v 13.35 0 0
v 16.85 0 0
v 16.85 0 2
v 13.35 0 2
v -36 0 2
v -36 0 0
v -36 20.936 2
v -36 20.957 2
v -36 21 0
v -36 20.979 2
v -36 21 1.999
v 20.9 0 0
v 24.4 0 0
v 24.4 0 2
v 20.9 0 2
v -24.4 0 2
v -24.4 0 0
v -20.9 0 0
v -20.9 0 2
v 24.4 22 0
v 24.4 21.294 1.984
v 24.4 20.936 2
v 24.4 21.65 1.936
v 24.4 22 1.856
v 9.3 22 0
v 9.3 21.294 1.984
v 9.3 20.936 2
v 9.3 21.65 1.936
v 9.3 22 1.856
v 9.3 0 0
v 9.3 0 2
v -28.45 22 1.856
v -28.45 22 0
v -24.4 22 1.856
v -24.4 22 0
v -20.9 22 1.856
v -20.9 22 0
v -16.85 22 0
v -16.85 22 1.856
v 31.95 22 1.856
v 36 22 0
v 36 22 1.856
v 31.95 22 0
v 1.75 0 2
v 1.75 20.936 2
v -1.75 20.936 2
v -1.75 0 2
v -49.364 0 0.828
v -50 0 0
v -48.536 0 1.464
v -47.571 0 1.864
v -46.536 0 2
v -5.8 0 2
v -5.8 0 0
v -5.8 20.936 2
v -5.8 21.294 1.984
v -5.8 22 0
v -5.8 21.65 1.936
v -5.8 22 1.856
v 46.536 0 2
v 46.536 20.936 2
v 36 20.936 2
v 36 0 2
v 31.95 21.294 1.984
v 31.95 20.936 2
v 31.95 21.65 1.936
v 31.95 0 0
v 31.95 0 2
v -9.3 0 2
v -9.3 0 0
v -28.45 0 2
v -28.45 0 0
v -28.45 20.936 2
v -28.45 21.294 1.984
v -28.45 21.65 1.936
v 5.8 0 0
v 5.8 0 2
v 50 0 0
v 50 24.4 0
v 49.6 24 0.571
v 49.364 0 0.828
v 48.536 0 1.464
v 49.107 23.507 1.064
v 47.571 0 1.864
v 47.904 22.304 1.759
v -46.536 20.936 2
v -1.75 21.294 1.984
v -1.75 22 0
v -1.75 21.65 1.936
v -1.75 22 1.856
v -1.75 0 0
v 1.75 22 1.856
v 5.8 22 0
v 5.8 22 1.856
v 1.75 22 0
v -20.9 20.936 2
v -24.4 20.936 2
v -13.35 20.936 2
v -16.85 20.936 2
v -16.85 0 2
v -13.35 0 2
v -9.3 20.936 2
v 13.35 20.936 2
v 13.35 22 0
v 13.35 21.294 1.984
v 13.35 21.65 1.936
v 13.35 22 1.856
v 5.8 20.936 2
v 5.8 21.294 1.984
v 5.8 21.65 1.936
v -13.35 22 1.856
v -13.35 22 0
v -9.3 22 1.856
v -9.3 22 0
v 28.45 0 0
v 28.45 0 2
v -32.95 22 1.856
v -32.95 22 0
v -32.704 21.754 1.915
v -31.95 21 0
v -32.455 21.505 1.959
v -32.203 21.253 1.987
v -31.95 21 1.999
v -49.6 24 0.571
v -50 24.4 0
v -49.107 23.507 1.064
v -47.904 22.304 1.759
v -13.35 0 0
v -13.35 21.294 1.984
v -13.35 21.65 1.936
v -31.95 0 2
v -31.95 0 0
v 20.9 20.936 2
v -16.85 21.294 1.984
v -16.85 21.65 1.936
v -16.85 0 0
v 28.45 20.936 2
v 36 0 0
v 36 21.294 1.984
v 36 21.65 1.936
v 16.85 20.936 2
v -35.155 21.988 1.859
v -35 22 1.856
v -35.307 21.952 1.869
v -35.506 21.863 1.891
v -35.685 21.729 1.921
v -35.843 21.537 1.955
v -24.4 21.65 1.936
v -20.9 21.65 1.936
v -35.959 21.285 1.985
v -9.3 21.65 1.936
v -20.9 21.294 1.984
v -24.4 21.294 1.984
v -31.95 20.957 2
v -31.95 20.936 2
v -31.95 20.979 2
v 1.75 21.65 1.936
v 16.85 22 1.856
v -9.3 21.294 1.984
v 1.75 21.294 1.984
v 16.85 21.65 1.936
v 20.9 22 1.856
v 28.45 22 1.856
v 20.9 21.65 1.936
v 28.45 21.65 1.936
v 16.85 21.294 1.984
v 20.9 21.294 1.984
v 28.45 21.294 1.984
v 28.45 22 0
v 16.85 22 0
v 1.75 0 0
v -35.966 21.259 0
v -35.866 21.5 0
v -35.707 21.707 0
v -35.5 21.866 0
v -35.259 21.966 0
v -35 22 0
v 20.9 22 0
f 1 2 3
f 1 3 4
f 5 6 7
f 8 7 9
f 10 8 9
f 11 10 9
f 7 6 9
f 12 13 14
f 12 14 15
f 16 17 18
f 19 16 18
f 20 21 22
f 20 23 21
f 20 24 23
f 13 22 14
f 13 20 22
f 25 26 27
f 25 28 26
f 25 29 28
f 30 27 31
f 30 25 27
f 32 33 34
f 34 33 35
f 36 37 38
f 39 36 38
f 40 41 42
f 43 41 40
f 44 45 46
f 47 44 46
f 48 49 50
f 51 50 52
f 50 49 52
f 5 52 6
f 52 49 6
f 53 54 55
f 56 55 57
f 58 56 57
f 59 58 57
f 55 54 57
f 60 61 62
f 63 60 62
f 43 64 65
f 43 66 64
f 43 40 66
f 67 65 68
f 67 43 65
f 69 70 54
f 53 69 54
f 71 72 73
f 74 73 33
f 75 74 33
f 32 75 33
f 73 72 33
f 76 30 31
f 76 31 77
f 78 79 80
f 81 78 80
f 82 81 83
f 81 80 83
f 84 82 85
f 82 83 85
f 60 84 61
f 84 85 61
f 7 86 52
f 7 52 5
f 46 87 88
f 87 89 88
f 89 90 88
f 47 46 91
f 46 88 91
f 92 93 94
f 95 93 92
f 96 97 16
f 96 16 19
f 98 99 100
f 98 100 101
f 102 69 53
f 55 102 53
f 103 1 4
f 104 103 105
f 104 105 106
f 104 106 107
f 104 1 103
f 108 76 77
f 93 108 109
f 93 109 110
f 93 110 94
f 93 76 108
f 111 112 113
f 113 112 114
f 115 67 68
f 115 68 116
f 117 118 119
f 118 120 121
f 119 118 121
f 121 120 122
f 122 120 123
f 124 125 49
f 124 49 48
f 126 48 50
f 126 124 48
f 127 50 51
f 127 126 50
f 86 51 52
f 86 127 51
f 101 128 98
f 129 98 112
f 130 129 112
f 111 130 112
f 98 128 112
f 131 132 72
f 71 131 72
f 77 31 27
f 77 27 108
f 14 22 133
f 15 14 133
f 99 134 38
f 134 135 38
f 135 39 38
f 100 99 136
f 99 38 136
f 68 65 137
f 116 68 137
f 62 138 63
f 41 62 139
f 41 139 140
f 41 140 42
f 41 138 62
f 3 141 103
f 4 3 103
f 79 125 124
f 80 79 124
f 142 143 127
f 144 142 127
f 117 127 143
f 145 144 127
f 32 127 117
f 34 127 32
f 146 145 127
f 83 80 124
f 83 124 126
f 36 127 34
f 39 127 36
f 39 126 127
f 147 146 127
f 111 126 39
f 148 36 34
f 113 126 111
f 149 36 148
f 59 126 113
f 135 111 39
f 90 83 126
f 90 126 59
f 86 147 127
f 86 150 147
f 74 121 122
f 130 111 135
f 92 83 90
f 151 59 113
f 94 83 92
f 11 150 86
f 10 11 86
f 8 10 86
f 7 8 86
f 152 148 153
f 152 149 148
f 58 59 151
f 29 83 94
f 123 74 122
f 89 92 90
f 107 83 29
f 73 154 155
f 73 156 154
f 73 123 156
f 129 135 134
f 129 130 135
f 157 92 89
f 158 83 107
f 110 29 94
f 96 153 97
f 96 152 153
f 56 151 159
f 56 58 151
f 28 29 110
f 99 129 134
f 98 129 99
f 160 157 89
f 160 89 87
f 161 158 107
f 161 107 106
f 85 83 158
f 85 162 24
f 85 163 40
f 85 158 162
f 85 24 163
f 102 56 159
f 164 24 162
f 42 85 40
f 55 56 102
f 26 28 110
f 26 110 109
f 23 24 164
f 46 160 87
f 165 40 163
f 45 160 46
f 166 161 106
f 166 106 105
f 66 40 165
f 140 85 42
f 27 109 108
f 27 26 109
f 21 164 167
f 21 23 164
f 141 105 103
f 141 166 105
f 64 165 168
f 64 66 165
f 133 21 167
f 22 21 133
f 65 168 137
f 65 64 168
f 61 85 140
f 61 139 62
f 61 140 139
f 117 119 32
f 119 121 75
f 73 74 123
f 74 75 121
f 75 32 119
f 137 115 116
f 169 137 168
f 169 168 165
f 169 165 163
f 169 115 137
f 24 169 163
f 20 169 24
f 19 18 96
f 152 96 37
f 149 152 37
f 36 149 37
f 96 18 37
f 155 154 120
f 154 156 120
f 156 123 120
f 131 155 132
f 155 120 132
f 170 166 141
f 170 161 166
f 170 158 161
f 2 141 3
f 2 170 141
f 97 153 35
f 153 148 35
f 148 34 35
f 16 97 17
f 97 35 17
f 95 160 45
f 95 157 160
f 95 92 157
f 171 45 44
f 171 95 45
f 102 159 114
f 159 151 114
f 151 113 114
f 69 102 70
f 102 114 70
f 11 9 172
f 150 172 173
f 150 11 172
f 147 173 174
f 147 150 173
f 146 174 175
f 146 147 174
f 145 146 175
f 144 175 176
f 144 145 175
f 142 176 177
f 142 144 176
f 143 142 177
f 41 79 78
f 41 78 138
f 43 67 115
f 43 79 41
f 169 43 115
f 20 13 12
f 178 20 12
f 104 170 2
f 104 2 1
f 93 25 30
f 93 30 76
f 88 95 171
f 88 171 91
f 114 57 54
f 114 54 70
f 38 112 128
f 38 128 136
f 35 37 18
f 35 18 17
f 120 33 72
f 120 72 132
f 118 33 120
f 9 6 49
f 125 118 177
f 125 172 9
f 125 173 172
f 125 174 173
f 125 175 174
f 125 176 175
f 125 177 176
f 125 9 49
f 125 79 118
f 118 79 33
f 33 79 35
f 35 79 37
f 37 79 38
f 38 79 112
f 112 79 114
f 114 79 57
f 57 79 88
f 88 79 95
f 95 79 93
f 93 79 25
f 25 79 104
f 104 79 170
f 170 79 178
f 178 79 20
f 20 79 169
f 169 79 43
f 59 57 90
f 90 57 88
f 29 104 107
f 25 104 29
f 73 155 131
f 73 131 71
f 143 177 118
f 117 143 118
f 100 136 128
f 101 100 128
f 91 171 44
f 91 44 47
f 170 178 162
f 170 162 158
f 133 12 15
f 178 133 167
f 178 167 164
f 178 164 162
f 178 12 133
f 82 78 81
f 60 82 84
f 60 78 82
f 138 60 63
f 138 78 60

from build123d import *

# Parameters (mm, degrees)
F1_DEPTH    = 2
F2_T1_DEPTH = 67.3205080757
F3_T1_DEPTH = 38.2564064606
F5_R        = 1
F6_SIZE     = 1


# Not quite as in the source:
# - a fillet or chamfer that OpenCascade refuses, or shapes differently, is made with other operations: its cross-section is extruded or revolved along the edge and cut away or added


with BuildPart() as f1:
    # F0 (on Top) → F1 (new body)
    with BuildSketch(Plane.XY):
        Polygon((-1.75, 0), (0, 0), (0, 24.4), (-50, 24.4), (-50, 0), (-36, 0), (-36, 22), (-31.95, 22), (-31.95, 0), (-28.45, 0), (-28.45, 22), (-24.4, 22), (-24.4, 0), (-20.9, 0), (-20.9, 22), (-16.85, 22), (-16.85, 0), (-13.35, 0), (-13.35, 22), (-9.3, 22), (-9.3, 0), (-5.8, 0), (-5.8, 22), (-1.75, 22), align=None)
    extrude(amount=F1_DEPTH)

    # F2: fillet of radius 4 on 1 edges, made by hand

    # F2_s2 → F2_t1 (cut)
    with BuildSketch(Plane.YZ.offset(-58.6602540378)):
        with BuildLine():
            ThreePointArc((24.4, 0), (22.9358983849, 1.4641016151), (20.9358983849, 2))
            Line((20.9358983849, 2), (24.4, 2))
            Line((24.4, 2), (24.4, 0))
        make_face()
    extrude(amount=F2_T1_DEPTH, mode=Mode.SUBTRACT)

    # F3: fillet of radius 4 on 1 edges, made by hand

    # F3_s2 → F3_t1 (cut)
    with BuildSketch(Plane.XZ.offset(-29.5961524227)):
        with BuildLine():
            ThreePointArc((-50, 0), (-48.5358983849, 1.4641016151), (-46.5358983849, 2))
            Line((-46.5358983849, 2), (-50, 2))
            Line((-50, 2), (-50, 0))
        make_face()
    extrude(amount=F3_T1_DEPTH, mode=Mode.SUBTRACT)

    # F4: F1 across plane


with BuildPart() as f1_1:
    add(f1.part)
    add(f1.part.mirror(Plane.YZ))

    # F5
    f5_edges = [f1_1.edges().sort_by_distance(p)[0] for p in [
        (-36, 22, 0.927932),
    ]]
    fillet(f5_edges, radius=F5_R)

    # F6
    f6_edges = [f1_1.edges().sort_by_distance(p)[0] for p in [
        (-31.95, 22, 0.927932),
    ]]
    chamfer(f6_edges, length=F6_SIZE)


solid = f1_1.part
